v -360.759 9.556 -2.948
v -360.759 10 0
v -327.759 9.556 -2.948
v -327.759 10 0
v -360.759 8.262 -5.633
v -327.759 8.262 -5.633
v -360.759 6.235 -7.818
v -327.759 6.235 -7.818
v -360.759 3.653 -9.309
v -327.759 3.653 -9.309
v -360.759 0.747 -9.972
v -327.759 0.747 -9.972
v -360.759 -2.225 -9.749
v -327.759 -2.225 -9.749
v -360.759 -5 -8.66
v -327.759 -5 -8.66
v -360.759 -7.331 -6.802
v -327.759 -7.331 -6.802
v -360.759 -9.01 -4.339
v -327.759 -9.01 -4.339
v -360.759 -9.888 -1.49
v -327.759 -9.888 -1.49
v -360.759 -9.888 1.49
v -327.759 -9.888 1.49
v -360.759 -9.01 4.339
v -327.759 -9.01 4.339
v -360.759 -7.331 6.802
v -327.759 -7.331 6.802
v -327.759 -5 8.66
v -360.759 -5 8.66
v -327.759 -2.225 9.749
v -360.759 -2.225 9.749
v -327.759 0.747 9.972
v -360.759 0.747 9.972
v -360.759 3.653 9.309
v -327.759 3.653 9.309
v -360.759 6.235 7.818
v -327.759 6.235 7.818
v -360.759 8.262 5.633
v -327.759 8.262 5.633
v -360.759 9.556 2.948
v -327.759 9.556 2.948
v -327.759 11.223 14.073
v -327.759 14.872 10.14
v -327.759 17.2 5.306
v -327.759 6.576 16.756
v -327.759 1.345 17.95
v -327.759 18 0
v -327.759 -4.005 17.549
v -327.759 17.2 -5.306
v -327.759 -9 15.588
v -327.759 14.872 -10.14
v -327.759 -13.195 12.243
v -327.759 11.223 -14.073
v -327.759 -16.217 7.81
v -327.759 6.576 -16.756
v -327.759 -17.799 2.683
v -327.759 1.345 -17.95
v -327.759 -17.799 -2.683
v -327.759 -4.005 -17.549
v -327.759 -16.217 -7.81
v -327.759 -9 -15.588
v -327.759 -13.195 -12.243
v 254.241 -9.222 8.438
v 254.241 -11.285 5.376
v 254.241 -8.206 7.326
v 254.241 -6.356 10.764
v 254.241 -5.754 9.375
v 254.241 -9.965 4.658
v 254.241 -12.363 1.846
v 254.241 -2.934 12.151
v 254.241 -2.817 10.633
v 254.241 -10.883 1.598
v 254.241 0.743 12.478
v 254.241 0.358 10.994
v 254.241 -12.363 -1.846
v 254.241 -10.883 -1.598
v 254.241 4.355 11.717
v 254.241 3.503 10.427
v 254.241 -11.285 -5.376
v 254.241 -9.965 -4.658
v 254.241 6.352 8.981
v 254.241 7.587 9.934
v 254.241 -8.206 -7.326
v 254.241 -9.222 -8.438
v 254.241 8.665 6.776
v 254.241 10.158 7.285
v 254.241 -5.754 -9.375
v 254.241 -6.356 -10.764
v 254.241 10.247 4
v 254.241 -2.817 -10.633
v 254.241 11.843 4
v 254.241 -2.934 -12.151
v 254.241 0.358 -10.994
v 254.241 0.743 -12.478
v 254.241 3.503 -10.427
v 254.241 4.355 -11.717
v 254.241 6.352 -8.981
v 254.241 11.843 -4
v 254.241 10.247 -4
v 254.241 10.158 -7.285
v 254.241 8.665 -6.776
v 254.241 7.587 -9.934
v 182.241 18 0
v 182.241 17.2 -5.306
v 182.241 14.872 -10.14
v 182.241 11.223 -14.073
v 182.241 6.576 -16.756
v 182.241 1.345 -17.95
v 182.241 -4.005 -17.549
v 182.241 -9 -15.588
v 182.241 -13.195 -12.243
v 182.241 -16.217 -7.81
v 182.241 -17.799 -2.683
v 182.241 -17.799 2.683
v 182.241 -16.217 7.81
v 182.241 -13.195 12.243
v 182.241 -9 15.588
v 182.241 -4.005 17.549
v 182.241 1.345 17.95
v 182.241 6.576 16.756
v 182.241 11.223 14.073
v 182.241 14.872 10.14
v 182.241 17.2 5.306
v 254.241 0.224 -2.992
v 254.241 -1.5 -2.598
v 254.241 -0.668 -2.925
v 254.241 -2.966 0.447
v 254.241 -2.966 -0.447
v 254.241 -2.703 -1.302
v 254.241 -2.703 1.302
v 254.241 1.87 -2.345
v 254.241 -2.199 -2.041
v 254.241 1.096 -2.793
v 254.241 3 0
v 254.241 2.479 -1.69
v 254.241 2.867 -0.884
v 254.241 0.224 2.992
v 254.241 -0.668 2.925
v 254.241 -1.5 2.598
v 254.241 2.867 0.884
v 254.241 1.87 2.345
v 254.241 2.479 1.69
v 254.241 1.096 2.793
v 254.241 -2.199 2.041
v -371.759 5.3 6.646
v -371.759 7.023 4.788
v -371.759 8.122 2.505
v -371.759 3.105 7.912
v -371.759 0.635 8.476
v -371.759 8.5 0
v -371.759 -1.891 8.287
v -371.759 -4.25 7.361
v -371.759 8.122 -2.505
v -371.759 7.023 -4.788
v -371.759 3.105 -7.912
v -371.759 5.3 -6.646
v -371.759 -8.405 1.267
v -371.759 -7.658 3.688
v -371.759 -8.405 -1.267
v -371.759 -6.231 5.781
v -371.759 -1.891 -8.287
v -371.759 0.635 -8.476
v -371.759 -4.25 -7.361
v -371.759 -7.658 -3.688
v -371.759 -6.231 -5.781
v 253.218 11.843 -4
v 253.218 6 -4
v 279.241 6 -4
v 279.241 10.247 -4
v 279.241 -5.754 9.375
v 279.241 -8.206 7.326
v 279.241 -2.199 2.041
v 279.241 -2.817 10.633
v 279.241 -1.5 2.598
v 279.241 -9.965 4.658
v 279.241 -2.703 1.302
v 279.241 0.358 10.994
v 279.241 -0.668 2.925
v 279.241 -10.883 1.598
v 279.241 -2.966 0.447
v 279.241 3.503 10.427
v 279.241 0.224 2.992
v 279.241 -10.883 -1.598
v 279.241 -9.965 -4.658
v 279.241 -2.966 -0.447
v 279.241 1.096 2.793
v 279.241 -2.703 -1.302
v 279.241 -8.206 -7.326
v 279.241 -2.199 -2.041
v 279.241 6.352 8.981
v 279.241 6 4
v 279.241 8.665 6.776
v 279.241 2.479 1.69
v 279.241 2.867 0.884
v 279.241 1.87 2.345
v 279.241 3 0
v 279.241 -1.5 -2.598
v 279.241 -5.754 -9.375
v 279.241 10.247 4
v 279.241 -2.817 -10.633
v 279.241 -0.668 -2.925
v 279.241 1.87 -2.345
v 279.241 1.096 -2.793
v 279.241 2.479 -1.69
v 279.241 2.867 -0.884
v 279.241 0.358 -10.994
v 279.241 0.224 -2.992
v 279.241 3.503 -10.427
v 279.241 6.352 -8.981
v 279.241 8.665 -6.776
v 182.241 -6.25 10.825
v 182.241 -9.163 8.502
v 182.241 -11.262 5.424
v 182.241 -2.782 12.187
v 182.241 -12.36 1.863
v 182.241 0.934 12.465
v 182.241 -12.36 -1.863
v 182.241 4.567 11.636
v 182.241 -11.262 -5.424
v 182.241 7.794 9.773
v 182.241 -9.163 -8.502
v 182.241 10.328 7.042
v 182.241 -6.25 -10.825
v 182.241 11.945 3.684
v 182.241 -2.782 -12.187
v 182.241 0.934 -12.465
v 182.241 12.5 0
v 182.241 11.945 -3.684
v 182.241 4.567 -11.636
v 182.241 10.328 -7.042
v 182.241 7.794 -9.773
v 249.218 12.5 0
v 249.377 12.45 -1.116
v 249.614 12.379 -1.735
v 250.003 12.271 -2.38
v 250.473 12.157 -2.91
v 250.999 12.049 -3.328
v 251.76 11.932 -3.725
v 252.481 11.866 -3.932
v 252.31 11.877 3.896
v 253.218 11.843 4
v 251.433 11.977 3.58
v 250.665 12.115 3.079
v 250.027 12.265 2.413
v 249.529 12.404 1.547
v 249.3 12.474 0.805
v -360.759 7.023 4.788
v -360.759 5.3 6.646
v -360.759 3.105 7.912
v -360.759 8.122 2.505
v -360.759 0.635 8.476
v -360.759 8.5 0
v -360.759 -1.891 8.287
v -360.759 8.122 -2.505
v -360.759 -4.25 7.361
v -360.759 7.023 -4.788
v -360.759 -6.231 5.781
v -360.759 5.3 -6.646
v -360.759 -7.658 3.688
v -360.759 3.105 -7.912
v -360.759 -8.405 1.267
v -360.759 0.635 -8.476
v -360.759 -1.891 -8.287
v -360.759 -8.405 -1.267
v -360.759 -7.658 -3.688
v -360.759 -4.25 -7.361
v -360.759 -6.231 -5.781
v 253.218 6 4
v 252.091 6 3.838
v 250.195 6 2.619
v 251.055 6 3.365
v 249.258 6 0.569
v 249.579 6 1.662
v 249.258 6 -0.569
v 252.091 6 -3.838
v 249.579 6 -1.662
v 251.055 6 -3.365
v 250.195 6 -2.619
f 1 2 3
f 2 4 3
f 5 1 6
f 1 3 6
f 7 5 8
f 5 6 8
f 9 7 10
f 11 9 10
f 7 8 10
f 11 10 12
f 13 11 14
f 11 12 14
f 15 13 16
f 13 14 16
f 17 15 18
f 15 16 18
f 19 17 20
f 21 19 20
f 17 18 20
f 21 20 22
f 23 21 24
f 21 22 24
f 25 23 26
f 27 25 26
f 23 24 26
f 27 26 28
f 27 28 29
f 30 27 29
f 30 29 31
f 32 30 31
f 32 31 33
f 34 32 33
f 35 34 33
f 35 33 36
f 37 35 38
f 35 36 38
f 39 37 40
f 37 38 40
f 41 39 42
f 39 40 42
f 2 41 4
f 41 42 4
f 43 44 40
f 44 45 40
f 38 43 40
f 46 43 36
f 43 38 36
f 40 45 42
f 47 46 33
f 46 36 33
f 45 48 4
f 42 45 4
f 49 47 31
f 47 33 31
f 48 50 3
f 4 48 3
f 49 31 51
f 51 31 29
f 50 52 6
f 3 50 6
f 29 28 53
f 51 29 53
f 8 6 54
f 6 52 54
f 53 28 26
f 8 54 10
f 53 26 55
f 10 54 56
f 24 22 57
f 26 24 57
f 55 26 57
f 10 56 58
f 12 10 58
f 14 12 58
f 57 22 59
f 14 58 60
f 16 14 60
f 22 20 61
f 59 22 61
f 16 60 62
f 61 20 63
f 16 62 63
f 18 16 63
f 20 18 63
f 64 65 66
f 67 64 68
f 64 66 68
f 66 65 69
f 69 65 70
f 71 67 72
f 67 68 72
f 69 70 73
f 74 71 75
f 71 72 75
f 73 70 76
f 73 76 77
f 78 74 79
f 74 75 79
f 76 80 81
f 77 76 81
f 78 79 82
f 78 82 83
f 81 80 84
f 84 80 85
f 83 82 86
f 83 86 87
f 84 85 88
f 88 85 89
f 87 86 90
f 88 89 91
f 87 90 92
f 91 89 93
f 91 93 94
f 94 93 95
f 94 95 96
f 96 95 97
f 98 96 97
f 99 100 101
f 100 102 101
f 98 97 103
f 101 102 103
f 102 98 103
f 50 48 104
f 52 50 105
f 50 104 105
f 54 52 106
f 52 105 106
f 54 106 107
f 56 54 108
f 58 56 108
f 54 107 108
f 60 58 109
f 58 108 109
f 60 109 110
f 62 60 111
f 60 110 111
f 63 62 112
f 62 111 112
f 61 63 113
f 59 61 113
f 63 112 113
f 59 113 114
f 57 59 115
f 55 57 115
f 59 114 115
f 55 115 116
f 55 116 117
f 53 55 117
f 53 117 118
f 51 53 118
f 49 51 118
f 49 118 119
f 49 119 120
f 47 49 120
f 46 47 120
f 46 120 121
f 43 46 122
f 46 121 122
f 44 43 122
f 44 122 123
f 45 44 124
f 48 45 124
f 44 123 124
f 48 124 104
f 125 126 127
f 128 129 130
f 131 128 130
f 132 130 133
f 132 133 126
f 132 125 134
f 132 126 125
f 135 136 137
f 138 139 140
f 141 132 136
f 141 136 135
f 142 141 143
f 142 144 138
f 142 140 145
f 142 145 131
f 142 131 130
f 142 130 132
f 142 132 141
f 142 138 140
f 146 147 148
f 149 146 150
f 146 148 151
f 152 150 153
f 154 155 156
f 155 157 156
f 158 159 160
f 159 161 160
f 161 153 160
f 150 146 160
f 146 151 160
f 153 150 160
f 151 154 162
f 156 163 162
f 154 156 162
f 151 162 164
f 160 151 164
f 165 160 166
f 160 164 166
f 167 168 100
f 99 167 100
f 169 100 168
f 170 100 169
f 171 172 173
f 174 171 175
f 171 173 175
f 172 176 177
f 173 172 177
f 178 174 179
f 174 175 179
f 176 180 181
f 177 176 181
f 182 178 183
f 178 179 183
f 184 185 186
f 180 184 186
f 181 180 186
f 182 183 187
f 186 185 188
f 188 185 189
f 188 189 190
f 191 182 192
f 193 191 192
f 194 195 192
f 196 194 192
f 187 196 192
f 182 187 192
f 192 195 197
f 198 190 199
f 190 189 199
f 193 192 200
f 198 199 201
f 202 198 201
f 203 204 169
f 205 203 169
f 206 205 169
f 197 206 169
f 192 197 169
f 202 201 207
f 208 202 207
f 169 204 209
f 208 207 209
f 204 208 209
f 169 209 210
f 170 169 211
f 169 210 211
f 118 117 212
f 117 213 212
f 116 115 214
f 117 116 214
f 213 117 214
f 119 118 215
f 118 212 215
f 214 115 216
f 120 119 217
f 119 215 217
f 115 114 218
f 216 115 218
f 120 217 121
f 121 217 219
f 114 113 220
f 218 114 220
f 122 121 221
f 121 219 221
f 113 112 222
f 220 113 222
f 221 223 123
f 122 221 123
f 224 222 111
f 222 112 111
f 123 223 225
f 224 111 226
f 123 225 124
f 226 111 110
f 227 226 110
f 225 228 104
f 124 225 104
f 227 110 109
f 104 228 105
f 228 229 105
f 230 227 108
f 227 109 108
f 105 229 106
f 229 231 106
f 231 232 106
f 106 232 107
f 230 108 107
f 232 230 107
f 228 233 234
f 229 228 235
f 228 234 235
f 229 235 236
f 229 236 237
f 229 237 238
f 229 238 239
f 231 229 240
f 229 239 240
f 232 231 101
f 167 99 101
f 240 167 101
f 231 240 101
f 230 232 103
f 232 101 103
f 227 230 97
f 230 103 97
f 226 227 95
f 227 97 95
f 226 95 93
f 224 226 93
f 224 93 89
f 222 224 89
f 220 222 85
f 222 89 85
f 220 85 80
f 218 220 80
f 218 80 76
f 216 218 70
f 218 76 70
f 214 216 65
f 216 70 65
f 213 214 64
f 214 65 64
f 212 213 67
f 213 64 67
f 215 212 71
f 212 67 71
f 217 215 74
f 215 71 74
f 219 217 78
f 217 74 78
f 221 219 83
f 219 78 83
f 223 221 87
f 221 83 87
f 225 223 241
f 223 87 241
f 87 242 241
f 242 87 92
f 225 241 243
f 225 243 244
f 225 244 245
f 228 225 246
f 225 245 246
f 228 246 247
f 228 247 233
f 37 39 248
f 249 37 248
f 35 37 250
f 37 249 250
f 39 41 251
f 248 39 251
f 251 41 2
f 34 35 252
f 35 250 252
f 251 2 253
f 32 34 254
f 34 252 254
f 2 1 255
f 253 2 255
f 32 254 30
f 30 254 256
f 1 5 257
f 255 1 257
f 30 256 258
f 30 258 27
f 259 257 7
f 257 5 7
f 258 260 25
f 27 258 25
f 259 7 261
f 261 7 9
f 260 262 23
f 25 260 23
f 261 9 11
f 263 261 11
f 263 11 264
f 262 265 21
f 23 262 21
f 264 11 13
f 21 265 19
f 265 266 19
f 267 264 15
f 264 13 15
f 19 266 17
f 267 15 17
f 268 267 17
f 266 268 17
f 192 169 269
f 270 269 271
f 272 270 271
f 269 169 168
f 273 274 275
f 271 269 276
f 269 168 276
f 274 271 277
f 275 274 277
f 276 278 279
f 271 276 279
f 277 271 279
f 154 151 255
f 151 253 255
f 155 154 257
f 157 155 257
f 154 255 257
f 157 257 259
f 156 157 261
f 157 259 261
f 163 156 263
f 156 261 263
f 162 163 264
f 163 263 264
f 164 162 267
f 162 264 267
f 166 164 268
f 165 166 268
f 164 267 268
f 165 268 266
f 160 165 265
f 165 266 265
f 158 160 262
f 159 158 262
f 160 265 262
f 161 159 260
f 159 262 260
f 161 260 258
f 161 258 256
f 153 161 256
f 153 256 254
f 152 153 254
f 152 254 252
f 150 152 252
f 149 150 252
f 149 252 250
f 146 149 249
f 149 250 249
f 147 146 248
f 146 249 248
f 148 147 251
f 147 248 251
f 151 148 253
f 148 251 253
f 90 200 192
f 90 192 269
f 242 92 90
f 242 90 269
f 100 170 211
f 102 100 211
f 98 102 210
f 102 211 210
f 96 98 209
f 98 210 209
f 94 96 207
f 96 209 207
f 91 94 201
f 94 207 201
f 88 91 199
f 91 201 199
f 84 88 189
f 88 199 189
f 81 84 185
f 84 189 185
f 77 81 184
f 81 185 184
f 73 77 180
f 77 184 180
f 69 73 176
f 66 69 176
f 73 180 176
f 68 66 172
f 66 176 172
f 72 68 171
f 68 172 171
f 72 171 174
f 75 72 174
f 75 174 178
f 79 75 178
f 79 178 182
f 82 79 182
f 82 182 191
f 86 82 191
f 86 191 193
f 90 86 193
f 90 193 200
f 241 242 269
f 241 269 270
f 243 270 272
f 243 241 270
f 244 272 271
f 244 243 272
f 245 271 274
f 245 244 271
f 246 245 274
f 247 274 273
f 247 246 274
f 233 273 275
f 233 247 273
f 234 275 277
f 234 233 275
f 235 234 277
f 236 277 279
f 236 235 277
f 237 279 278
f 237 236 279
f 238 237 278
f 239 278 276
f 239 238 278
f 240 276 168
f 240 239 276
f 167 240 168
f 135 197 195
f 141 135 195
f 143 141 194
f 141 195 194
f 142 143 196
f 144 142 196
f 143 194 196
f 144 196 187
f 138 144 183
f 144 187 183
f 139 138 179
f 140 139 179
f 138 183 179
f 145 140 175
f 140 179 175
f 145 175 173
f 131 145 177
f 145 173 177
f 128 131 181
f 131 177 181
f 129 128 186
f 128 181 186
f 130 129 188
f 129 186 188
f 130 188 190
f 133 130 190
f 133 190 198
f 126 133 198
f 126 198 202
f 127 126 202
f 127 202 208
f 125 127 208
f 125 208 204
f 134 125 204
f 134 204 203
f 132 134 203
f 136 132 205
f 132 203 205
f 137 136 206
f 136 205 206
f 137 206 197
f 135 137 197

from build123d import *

# Parameters (mm, degrees)
CUT_EXTRUDE1_DEPTH = 14
SKETCH4_R          = 3
CUT_EXTRUDE2_DEPTH = 25


with BuildPart() as part:
    # Sketch1 → Revolve1 (revolve)
    with BuildSketch(Plane.XY):
        Polygon((254.240699987, 11), (279.240699987, 11), (279.240699987, 0), (-371.759300013, 0), (-371.759300013, 8.5), (-360.759300013, 8.5), (-360.759300013, 10), (-327.759300013, 10), (-327.759300013, 18), (182.240699987, 18), (182.240699987, 12.5), (254.240699987, 12.5), align=None)
    revolve(axis=Axis((279.240699987, 0, 0), (-1, 0, 0)))

    # Sketch3 → Cut-Extrude1 (cut)
    with BuildSketch(Plane(origin=(0, 20, 0), x_dir=(1, 0, 0), z_dir=(0, 1, 0))):
        with BuildLine():
            Line((279.240699987, -4), (253.217727507, -4))
            ThreePointArc((253.217727507, -4), (249.217727507, 0), (253.217727507, 4))
            Line((253.217727507, 4), (279.240699987, 4))
            ThreePointArc((279.240699987, 4), (283.240699987, 0), (279.240699987, -4))
        make_face()
    extrude(amount=-CUT_EXTRUDE1_DEPTH, mode=Mode.SUBTRACT)

    # Sketch4 → Cut-Extrude2 (cut)
    with BuildSketch(Plane(origin=(279.240699987, 0, 0), x_dir=(0, 0, -1), z_dir=(1, 0, 0))):
        with Locations(Location((0, 0, 0), (0, 0, 90))):
            Circle(SKETCH4_R)
    extrude(amount=-CUT_EXTRUDE2_DEPTH, mode=Mode.SUBTRACT)


solid = part.part
